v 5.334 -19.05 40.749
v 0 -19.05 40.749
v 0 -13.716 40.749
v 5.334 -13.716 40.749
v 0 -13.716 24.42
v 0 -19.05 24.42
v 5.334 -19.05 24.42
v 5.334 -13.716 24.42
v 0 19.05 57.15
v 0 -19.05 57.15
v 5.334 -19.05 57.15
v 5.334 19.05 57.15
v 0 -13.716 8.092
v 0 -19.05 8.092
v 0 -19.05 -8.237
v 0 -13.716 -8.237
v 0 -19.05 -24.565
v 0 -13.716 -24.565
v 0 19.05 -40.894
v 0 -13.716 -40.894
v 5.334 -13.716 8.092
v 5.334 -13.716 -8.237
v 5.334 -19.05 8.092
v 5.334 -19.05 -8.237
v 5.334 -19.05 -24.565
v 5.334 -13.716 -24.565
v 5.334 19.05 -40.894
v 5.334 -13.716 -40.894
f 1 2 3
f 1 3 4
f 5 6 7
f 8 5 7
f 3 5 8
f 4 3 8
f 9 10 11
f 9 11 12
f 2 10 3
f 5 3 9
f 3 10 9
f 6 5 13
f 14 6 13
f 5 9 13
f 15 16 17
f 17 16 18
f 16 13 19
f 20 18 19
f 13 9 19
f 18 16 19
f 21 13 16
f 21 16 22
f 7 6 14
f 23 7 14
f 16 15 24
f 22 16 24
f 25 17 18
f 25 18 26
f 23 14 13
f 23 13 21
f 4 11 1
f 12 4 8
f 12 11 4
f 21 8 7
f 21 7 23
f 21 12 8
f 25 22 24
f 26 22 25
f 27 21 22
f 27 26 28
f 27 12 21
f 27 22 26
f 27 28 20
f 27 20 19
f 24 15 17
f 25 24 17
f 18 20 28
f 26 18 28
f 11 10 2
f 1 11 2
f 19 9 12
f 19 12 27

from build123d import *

# Parameters (mm, degrees)
SKETCH2_W           = 114.3
SKETCH2_H           = 38.1
BOSS_EXTRUDE2_DEPTH = 5.334
SKETCH3_W           = 16.256
SKETCH3_H           = 38.1
CUT_EXTRUDE3_DEPTH  = 61.477074632
CAVITY1_START       = -19.05
CAVITY1_OUTLINE_W   = 5.334
CAVITY1_OUTLINE_H   = 16.328571429
CAVITY1_DEPTH       = 5.334


# Read off the part's stored shape, not the designer's step: Cavity1
with BuildPart() as part:
    # Sketch2 → Boss-Extrude2 (new body)
    with BuildSketch(Plane(origin=(0, 0, 0), x_dir=(0, 0, -1), z_dir=(1, 0, 0))):
        Rectangle(SKETCH2_W, SKETCH2_H)
    extrude(amount=BOSS_EXTRUDE2_DEPTH)

    # Sketch3 → Cut-Extrude3 (cut, through all)
    with BuildSketch(Plane(origin=(5.334, 0, 0), x_dir=(0, 0, -1), z_dir=(1, 0, 0))):
        with Locations((49.022, 0)):
            Rectangle(SKETCH3_W, SKETCH3_H)
    extrude(amount=-CUT_EXTRUDE3_DEPTH, mode=Mode.SUBTRACT)

    # Cavity1 outline → Cavity1 (cut)
    with BuildSketch(Plane(origin=(0, 0, 0), x_dir=(1, 0, 0), z_dir=(0, 1, 0)).offset(CAVITY1_START)):
        with Locations((2.667, 32.729714286)):
            Rectangle(CAVITY1_OUTLINE_W, CAVITY1_OUTLINE_H)
        with Locations((2.667, 0.072571428)):
            Rectangle(CAVITY1_OUTLINE_W, CAVITY1_OUTLINE_H)
        with Locations((2.667, -32.584571428)):
            Rectangle(CAVITY1_OUTLINE_W, CAVITY1_OUTLINE_H)
    extrude(amount=CAVITY1_DEPTH, mode=Mode.SUBTRACT)


solid = part.part
